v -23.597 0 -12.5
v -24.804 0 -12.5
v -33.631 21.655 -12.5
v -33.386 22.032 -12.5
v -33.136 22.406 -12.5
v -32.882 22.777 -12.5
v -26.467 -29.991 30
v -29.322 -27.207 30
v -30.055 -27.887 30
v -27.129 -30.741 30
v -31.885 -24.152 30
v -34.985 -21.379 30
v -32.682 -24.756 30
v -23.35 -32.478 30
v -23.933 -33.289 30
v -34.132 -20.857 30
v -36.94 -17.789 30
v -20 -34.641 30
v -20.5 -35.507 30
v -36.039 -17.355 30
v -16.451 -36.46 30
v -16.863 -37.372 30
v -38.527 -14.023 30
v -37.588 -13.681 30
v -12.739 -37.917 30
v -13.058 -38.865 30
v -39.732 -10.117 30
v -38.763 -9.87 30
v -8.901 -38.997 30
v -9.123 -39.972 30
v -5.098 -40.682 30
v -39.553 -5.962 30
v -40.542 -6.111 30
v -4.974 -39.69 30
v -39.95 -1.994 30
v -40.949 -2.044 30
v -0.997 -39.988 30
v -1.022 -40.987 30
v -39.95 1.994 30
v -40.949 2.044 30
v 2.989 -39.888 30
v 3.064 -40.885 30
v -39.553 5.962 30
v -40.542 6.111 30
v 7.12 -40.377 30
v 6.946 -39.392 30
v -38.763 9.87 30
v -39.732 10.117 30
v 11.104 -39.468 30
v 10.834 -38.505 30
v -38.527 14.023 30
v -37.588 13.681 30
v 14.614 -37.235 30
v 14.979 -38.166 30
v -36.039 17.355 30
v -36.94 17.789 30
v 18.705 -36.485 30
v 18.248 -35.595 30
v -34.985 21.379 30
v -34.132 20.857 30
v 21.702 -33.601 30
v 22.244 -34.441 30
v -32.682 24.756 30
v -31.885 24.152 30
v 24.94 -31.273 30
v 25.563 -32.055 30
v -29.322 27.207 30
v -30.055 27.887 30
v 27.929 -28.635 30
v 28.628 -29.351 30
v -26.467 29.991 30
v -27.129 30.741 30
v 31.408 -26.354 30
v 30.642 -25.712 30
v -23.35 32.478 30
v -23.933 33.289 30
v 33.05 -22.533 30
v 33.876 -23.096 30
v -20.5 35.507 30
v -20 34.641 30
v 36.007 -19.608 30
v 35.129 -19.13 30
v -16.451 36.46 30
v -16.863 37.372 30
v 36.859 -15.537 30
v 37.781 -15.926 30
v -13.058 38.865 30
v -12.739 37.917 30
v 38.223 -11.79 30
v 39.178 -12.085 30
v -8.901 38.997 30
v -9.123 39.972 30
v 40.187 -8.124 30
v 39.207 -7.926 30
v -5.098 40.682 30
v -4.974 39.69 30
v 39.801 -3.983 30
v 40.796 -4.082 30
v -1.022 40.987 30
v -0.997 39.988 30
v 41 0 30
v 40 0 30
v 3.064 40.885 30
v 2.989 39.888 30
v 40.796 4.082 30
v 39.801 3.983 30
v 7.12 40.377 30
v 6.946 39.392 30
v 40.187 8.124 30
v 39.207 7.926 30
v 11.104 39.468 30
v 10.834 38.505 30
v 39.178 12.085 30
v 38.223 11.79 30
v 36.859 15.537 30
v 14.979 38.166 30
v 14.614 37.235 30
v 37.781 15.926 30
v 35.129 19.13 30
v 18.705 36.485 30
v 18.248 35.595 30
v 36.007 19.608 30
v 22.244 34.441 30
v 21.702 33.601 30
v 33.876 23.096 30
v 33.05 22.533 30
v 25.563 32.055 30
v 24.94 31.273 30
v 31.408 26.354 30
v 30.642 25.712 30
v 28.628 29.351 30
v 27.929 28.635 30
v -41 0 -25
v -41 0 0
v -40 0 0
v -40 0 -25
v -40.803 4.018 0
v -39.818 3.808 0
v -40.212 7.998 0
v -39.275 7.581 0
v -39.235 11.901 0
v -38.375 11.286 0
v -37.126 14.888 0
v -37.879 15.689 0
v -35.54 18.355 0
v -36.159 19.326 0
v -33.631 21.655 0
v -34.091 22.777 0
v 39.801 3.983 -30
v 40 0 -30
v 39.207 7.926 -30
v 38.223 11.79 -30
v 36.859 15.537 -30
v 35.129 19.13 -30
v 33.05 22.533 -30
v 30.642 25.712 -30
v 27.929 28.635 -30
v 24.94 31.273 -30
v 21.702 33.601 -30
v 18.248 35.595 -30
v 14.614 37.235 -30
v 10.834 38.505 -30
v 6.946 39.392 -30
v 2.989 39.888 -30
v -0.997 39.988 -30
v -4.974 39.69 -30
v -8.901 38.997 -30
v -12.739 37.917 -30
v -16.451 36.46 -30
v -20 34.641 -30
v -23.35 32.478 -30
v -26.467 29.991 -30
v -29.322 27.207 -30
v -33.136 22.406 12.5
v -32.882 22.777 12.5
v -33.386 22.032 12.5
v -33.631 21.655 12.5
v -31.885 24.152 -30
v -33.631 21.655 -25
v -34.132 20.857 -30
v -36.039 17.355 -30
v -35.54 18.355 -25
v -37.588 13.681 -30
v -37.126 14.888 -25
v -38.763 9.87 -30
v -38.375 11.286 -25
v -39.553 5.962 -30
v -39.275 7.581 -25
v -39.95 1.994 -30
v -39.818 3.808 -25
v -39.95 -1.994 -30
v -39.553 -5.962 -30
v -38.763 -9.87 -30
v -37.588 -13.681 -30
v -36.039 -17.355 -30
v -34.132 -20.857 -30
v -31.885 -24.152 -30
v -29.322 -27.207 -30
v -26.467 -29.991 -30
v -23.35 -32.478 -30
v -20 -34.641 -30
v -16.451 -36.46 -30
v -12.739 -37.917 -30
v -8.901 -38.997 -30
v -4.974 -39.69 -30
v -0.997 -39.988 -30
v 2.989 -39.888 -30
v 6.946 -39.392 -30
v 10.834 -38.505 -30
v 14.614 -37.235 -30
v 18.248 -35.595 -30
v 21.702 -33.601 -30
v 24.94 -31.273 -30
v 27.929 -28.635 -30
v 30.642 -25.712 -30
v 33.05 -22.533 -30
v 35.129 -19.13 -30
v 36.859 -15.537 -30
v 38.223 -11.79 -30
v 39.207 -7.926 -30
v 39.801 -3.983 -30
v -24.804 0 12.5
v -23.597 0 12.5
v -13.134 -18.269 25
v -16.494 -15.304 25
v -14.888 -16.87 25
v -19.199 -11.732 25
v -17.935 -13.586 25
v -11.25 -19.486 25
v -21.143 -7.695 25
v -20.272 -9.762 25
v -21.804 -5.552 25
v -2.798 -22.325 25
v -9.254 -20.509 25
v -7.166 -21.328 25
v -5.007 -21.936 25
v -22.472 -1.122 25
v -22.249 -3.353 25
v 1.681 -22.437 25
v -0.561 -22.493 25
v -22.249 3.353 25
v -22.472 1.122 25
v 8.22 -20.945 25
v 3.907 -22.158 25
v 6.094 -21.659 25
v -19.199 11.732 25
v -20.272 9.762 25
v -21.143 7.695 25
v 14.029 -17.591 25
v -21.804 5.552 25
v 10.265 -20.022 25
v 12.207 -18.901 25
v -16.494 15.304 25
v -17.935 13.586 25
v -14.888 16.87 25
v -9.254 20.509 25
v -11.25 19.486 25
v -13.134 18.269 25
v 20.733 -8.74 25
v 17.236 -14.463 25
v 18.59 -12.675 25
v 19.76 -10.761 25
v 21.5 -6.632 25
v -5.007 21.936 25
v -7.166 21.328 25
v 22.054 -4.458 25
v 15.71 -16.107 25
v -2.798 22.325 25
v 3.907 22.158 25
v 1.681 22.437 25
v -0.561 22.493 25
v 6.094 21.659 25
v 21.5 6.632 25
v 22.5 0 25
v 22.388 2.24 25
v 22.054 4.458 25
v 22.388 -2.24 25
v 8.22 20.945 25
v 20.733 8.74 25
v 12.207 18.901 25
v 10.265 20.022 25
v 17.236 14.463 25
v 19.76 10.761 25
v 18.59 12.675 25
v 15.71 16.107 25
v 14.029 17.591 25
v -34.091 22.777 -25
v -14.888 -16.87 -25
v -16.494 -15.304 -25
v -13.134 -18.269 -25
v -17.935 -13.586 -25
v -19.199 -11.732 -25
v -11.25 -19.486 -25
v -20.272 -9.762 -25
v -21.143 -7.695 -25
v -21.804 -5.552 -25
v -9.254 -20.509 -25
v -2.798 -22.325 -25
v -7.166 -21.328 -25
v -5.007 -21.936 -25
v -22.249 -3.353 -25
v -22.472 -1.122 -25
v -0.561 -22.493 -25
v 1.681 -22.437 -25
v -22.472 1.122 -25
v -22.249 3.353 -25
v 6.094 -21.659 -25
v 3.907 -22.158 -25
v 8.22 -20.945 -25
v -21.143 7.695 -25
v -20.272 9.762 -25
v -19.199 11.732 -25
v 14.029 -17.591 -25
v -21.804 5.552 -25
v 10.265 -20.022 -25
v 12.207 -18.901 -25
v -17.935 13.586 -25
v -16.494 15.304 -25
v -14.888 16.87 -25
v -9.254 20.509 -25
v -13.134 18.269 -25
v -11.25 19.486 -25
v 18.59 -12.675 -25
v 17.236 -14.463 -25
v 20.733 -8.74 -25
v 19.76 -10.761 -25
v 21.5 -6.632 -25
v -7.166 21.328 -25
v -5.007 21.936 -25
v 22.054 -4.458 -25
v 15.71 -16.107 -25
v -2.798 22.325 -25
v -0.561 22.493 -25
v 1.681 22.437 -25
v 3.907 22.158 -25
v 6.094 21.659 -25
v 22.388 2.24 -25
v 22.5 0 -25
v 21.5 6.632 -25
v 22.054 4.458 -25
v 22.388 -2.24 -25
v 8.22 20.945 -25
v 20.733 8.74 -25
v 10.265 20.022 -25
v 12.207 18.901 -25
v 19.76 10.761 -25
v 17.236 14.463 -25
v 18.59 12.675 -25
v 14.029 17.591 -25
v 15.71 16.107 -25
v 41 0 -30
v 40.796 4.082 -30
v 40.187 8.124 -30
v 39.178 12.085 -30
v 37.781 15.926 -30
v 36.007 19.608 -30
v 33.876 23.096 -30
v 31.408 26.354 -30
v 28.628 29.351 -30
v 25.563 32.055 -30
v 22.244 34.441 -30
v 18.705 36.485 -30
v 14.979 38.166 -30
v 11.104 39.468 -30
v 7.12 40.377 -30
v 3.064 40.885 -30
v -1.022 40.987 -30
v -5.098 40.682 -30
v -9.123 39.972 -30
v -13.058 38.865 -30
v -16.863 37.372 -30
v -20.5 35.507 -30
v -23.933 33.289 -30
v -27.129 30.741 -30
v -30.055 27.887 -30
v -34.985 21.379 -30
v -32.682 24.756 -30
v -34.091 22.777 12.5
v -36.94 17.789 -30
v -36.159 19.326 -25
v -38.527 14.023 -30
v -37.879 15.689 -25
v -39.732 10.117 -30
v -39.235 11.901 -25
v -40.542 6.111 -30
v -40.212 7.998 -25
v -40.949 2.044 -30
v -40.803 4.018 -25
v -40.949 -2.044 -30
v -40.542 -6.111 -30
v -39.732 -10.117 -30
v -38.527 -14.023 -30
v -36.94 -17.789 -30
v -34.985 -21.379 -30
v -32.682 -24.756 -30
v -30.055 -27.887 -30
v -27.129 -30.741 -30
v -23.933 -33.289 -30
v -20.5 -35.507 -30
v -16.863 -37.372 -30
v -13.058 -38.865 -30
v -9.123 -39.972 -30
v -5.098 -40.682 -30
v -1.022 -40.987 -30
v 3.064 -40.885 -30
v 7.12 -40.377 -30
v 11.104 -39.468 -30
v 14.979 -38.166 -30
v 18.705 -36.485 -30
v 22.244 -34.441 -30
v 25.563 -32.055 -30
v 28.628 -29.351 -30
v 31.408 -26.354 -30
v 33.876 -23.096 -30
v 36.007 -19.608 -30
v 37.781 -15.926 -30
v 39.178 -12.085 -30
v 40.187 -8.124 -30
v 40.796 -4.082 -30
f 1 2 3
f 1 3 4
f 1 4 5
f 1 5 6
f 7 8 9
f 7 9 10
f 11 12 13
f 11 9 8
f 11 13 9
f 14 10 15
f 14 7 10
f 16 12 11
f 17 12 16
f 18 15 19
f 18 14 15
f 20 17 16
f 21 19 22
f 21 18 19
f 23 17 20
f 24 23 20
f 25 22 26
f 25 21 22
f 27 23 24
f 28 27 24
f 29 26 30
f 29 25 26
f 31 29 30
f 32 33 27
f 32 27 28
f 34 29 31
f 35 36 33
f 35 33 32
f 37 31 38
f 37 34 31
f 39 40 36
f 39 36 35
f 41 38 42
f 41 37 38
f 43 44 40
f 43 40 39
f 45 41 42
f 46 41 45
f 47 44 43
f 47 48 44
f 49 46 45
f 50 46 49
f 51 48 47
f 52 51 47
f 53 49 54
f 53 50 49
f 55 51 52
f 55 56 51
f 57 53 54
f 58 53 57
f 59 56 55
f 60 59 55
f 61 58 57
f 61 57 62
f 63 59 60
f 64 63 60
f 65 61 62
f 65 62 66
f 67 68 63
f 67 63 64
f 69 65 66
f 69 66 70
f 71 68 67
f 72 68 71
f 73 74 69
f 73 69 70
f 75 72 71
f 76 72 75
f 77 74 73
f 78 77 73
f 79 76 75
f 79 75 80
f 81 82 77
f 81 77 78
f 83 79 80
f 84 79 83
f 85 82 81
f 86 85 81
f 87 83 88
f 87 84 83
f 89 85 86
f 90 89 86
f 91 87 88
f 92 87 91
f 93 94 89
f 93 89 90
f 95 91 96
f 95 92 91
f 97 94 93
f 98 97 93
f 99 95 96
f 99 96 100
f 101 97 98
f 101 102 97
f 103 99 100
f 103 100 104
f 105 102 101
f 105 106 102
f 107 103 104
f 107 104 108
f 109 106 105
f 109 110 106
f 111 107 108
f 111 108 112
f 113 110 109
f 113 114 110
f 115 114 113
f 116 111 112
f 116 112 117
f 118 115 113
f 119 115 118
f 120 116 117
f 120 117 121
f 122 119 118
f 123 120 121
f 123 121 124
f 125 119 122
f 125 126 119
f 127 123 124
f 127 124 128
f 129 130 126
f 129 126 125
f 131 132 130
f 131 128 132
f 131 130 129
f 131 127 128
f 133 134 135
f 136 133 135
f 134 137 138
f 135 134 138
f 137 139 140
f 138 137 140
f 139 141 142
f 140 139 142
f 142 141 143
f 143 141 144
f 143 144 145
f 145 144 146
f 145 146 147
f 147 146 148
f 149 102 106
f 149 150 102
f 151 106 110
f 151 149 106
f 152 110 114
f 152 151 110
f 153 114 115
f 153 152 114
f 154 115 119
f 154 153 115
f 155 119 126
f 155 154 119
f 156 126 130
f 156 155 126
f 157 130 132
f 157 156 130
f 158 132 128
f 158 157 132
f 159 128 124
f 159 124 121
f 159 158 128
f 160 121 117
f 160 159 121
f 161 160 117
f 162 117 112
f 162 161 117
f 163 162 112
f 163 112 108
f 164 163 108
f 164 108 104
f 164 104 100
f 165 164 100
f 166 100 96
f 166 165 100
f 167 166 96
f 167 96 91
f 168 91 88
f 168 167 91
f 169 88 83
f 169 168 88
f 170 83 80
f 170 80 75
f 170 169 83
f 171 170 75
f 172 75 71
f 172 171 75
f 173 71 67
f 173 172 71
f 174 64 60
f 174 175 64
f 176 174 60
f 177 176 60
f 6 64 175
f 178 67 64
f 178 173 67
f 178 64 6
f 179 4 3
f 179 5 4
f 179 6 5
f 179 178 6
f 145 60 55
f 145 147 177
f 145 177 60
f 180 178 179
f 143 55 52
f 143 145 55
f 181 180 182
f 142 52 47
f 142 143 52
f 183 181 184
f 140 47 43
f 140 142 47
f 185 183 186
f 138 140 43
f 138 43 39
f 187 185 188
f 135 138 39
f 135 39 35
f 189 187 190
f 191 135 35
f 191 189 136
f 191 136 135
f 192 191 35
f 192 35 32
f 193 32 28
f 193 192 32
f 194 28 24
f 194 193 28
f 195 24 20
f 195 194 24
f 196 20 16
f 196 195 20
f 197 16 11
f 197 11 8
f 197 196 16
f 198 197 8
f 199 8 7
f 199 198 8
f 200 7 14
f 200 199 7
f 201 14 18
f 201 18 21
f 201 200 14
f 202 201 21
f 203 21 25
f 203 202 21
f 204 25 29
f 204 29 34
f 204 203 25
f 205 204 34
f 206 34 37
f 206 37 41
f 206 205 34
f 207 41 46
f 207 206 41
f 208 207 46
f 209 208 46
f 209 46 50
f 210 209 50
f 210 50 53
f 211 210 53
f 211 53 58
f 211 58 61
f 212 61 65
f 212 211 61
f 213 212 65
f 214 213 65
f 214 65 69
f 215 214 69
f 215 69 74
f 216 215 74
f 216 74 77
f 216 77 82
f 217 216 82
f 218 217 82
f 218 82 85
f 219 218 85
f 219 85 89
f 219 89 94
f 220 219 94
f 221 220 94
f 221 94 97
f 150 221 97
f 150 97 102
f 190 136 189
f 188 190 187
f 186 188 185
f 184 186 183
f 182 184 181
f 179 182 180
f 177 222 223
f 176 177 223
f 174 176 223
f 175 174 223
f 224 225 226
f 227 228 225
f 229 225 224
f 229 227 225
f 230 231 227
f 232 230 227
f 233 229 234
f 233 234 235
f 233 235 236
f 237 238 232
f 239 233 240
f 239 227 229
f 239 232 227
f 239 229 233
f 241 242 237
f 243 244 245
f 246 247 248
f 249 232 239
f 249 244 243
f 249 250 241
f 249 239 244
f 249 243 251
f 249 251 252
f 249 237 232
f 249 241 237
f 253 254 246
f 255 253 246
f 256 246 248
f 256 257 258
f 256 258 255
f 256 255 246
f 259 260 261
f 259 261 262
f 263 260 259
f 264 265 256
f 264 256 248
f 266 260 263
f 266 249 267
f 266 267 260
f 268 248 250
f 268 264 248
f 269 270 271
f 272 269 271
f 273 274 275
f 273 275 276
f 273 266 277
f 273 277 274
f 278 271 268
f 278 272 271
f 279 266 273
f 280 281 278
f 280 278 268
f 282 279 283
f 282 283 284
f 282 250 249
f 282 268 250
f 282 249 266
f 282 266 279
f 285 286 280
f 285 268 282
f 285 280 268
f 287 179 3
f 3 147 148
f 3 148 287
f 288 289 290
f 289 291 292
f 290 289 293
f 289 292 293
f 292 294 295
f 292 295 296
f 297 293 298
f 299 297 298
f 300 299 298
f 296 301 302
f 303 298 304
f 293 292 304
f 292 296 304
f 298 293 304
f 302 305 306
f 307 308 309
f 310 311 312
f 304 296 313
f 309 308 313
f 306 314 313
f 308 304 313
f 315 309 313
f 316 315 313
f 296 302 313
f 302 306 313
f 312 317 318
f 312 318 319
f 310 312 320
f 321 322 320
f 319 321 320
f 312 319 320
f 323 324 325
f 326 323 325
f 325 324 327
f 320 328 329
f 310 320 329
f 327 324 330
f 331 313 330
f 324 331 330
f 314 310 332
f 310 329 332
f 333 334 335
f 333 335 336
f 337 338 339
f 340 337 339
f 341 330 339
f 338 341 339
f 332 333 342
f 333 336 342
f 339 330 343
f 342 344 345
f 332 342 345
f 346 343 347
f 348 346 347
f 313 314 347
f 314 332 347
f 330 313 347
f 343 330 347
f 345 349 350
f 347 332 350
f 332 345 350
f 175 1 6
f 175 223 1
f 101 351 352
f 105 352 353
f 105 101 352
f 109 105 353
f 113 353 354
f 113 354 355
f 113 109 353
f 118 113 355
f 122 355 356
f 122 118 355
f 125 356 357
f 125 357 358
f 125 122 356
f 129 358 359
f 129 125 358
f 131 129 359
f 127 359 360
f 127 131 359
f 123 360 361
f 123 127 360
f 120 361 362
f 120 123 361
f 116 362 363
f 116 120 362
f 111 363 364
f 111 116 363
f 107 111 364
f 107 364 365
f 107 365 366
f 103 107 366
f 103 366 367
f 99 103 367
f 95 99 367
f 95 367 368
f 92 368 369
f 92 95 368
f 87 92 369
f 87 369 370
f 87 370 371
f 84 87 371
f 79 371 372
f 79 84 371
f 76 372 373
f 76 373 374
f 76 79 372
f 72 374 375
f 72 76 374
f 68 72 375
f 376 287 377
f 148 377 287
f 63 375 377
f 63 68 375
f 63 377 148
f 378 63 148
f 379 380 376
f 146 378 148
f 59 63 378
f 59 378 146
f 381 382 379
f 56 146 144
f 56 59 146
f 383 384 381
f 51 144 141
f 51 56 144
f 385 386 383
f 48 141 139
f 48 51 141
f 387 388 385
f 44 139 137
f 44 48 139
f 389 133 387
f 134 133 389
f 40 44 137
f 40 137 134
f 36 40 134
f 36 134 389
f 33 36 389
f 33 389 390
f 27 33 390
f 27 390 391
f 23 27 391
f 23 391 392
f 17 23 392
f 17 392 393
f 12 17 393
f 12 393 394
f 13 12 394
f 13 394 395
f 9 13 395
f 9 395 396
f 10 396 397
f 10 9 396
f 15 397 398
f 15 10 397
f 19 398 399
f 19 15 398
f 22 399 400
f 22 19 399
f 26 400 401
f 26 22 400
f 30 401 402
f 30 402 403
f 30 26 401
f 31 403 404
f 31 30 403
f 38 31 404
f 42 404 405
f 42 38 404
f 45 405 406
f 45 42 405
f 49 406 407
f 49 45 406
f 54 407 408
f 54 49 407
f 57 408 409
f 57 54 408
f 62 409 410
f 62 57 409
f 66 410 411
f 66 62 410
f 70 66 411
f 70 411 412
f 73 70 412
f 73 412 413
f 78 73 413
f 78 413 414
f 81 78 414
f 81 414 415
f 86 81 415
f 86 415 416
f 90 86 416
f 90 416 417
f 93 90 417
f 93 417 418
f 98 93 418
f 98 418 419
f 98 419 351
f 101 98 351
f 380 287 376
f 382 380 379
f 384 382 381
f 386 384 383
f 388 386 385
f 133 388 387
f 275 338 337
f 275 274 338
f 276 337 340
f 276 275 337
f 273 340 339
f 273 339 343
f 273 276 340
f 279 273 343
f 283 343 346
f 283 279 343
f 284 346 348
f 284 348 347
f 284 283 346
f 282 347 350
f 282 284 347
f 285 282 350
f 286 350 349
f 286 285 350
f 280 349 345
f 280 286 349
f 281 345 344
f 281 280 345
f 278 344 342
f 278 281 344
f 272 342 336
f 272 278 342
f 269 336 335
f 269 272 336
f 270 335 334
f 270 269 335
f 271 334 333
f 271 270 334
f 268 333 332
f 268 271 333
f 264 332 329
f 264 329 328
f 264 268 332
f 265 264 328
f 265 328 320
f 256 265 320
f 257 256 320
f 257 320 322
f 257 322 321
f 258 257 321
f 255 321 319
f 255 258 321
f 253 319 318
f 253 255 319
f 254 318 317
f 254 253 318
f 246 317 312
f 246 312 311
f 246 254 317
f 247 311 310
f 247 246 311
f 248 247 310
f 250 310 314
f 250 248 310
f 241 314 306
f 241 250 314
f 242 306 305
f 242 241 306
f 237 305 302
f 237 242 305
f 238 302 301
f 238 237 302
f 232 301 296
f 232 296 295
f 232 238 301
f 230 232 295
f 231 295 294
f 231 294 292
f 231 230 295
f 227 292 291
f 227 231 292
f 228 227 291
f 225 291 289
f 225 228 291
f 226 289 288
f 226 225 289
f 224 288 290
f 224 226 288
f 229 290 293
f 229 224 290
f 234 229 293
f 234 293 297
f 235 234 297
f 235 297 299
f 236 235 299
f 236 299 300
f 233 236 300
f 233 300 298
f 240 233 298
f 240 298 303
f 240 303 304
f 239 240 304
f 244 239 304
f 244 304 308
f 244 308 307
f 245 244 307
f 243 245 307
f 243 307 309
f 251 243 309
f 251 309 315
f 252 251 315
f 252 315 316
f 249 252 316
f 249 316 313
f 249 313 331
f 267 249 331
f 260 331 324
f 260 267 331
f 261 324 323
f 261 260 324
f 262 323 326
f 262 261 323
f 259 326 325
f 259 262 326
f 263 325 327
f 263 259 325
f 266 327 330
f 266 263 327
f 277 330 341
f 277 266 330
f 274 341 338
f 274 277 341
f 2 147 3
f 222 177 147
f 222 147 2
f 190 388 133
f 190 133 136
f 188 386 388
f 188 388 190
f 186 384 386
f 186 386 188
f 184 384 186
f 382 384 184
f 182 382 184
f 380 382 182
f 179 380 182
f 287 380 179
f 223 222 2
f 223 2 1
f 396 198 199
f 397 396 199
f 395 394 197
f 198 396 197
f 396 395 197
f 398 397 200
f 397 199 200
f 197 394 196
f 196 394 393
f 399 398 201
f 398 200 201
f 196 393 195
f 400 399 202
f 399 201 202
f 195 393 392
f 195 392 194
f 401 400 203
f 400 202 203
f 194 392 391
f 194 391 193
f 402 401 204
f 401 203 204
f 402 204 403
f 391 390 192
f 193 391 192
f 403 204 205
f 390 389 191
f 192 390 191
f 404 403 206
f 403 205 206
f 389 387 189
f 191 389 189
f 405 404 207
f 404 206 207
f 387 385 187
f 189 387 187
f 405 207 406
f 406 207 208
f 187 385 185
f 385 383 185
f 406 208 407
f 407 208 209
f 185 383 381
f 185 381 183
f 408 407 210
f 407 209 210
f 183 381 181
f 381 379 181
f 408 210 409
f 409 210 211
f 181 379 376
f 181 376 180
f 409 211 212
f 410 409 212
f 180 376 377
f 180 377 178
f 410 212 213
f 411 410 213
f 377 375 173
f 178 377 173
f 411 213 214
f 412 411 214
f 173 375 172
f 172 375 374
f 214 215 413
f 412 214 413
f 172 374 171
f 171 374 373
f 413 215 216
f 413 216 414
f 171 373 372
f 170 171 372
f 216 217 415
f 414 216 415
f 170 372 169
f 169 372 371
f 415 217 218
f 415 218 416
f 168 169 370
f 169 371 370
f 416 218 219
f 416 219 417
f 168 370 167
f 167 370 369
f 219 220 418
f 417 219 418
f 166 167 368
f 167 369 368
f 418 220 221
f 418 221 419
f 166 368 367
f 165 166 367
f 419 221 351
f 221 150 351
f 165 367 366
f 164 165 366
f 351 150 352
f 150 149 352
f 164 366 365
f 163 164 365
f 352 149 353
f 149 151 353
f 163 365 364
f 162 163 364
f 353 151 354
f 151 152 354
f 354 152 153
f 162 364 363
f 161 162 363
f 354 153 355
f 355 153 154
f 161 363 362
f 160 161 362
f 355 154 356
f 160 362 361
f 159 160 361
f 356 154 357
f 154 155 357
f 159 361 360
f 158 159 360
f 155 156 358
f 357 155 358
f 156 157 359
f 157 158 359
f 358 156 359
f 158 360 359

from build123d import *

# Parameters (mm, degrees)
F0_R     = 22.5
F1_DEPTH = 25
F0_R_2   = 41
F0_R_3   = 40
F2_DEPTH = 30
F4_DEPTH = 12.5
F5_DEPTH = 25


with BuildPart() as f1:
    # F0 (on Top) → F1 (new body, symmetric)
    with BuildSketch(Plane.XY):
        Circle(F0_R)
    extrude(amount=F1_DEPTH, both=True)


with BuildPart() as f2:
    # F0 (on Top) → F2 (new body, symmetric)
    with BuildSketch(Plane.XY):
        Circle(F0_R_2)
        Circle(F0_R_3, mode=Mode.SUBTRACT)
    extrude(amount=F2_DEPTH, both=True)

    # F3 (on Top) → F4 (join, symmetric)
    with BuildSketch(Plane.XY):
        Polygon((-34.0911263885, 22.7770740343), (-33.6312304821, 21.6550302762), (-24.8035956174, 0), (-23.5966462642, 0), (-32.8816802861, 22.7770740343), align=None)
    extrude(amount=F4_DEPTH, both=True)

    # F3 (on Top) → F5 (cut)
    with BuildSketch(Plane.XY):
        with BuildLine():
            ThreePointArc((-40, 0), (-38.3747913303, 11.2860706341), (-33.6312304821, 21.6550302762))
            Line((-33.6312304821, 21.6550302762), (-34.0911263885, 22.7770740343))
            ThreePointArc((-34.0911263885, 22.7770740343), (-39.234781648, 11.9009205121), (-41, 0))
            Line((-41, 0), (-40, 0))
        make_face()
    extrude(amount=-F5_DEPTH, mode=Mode.SUBTRACT)


solid = Compound([f1.part, f2.part])
